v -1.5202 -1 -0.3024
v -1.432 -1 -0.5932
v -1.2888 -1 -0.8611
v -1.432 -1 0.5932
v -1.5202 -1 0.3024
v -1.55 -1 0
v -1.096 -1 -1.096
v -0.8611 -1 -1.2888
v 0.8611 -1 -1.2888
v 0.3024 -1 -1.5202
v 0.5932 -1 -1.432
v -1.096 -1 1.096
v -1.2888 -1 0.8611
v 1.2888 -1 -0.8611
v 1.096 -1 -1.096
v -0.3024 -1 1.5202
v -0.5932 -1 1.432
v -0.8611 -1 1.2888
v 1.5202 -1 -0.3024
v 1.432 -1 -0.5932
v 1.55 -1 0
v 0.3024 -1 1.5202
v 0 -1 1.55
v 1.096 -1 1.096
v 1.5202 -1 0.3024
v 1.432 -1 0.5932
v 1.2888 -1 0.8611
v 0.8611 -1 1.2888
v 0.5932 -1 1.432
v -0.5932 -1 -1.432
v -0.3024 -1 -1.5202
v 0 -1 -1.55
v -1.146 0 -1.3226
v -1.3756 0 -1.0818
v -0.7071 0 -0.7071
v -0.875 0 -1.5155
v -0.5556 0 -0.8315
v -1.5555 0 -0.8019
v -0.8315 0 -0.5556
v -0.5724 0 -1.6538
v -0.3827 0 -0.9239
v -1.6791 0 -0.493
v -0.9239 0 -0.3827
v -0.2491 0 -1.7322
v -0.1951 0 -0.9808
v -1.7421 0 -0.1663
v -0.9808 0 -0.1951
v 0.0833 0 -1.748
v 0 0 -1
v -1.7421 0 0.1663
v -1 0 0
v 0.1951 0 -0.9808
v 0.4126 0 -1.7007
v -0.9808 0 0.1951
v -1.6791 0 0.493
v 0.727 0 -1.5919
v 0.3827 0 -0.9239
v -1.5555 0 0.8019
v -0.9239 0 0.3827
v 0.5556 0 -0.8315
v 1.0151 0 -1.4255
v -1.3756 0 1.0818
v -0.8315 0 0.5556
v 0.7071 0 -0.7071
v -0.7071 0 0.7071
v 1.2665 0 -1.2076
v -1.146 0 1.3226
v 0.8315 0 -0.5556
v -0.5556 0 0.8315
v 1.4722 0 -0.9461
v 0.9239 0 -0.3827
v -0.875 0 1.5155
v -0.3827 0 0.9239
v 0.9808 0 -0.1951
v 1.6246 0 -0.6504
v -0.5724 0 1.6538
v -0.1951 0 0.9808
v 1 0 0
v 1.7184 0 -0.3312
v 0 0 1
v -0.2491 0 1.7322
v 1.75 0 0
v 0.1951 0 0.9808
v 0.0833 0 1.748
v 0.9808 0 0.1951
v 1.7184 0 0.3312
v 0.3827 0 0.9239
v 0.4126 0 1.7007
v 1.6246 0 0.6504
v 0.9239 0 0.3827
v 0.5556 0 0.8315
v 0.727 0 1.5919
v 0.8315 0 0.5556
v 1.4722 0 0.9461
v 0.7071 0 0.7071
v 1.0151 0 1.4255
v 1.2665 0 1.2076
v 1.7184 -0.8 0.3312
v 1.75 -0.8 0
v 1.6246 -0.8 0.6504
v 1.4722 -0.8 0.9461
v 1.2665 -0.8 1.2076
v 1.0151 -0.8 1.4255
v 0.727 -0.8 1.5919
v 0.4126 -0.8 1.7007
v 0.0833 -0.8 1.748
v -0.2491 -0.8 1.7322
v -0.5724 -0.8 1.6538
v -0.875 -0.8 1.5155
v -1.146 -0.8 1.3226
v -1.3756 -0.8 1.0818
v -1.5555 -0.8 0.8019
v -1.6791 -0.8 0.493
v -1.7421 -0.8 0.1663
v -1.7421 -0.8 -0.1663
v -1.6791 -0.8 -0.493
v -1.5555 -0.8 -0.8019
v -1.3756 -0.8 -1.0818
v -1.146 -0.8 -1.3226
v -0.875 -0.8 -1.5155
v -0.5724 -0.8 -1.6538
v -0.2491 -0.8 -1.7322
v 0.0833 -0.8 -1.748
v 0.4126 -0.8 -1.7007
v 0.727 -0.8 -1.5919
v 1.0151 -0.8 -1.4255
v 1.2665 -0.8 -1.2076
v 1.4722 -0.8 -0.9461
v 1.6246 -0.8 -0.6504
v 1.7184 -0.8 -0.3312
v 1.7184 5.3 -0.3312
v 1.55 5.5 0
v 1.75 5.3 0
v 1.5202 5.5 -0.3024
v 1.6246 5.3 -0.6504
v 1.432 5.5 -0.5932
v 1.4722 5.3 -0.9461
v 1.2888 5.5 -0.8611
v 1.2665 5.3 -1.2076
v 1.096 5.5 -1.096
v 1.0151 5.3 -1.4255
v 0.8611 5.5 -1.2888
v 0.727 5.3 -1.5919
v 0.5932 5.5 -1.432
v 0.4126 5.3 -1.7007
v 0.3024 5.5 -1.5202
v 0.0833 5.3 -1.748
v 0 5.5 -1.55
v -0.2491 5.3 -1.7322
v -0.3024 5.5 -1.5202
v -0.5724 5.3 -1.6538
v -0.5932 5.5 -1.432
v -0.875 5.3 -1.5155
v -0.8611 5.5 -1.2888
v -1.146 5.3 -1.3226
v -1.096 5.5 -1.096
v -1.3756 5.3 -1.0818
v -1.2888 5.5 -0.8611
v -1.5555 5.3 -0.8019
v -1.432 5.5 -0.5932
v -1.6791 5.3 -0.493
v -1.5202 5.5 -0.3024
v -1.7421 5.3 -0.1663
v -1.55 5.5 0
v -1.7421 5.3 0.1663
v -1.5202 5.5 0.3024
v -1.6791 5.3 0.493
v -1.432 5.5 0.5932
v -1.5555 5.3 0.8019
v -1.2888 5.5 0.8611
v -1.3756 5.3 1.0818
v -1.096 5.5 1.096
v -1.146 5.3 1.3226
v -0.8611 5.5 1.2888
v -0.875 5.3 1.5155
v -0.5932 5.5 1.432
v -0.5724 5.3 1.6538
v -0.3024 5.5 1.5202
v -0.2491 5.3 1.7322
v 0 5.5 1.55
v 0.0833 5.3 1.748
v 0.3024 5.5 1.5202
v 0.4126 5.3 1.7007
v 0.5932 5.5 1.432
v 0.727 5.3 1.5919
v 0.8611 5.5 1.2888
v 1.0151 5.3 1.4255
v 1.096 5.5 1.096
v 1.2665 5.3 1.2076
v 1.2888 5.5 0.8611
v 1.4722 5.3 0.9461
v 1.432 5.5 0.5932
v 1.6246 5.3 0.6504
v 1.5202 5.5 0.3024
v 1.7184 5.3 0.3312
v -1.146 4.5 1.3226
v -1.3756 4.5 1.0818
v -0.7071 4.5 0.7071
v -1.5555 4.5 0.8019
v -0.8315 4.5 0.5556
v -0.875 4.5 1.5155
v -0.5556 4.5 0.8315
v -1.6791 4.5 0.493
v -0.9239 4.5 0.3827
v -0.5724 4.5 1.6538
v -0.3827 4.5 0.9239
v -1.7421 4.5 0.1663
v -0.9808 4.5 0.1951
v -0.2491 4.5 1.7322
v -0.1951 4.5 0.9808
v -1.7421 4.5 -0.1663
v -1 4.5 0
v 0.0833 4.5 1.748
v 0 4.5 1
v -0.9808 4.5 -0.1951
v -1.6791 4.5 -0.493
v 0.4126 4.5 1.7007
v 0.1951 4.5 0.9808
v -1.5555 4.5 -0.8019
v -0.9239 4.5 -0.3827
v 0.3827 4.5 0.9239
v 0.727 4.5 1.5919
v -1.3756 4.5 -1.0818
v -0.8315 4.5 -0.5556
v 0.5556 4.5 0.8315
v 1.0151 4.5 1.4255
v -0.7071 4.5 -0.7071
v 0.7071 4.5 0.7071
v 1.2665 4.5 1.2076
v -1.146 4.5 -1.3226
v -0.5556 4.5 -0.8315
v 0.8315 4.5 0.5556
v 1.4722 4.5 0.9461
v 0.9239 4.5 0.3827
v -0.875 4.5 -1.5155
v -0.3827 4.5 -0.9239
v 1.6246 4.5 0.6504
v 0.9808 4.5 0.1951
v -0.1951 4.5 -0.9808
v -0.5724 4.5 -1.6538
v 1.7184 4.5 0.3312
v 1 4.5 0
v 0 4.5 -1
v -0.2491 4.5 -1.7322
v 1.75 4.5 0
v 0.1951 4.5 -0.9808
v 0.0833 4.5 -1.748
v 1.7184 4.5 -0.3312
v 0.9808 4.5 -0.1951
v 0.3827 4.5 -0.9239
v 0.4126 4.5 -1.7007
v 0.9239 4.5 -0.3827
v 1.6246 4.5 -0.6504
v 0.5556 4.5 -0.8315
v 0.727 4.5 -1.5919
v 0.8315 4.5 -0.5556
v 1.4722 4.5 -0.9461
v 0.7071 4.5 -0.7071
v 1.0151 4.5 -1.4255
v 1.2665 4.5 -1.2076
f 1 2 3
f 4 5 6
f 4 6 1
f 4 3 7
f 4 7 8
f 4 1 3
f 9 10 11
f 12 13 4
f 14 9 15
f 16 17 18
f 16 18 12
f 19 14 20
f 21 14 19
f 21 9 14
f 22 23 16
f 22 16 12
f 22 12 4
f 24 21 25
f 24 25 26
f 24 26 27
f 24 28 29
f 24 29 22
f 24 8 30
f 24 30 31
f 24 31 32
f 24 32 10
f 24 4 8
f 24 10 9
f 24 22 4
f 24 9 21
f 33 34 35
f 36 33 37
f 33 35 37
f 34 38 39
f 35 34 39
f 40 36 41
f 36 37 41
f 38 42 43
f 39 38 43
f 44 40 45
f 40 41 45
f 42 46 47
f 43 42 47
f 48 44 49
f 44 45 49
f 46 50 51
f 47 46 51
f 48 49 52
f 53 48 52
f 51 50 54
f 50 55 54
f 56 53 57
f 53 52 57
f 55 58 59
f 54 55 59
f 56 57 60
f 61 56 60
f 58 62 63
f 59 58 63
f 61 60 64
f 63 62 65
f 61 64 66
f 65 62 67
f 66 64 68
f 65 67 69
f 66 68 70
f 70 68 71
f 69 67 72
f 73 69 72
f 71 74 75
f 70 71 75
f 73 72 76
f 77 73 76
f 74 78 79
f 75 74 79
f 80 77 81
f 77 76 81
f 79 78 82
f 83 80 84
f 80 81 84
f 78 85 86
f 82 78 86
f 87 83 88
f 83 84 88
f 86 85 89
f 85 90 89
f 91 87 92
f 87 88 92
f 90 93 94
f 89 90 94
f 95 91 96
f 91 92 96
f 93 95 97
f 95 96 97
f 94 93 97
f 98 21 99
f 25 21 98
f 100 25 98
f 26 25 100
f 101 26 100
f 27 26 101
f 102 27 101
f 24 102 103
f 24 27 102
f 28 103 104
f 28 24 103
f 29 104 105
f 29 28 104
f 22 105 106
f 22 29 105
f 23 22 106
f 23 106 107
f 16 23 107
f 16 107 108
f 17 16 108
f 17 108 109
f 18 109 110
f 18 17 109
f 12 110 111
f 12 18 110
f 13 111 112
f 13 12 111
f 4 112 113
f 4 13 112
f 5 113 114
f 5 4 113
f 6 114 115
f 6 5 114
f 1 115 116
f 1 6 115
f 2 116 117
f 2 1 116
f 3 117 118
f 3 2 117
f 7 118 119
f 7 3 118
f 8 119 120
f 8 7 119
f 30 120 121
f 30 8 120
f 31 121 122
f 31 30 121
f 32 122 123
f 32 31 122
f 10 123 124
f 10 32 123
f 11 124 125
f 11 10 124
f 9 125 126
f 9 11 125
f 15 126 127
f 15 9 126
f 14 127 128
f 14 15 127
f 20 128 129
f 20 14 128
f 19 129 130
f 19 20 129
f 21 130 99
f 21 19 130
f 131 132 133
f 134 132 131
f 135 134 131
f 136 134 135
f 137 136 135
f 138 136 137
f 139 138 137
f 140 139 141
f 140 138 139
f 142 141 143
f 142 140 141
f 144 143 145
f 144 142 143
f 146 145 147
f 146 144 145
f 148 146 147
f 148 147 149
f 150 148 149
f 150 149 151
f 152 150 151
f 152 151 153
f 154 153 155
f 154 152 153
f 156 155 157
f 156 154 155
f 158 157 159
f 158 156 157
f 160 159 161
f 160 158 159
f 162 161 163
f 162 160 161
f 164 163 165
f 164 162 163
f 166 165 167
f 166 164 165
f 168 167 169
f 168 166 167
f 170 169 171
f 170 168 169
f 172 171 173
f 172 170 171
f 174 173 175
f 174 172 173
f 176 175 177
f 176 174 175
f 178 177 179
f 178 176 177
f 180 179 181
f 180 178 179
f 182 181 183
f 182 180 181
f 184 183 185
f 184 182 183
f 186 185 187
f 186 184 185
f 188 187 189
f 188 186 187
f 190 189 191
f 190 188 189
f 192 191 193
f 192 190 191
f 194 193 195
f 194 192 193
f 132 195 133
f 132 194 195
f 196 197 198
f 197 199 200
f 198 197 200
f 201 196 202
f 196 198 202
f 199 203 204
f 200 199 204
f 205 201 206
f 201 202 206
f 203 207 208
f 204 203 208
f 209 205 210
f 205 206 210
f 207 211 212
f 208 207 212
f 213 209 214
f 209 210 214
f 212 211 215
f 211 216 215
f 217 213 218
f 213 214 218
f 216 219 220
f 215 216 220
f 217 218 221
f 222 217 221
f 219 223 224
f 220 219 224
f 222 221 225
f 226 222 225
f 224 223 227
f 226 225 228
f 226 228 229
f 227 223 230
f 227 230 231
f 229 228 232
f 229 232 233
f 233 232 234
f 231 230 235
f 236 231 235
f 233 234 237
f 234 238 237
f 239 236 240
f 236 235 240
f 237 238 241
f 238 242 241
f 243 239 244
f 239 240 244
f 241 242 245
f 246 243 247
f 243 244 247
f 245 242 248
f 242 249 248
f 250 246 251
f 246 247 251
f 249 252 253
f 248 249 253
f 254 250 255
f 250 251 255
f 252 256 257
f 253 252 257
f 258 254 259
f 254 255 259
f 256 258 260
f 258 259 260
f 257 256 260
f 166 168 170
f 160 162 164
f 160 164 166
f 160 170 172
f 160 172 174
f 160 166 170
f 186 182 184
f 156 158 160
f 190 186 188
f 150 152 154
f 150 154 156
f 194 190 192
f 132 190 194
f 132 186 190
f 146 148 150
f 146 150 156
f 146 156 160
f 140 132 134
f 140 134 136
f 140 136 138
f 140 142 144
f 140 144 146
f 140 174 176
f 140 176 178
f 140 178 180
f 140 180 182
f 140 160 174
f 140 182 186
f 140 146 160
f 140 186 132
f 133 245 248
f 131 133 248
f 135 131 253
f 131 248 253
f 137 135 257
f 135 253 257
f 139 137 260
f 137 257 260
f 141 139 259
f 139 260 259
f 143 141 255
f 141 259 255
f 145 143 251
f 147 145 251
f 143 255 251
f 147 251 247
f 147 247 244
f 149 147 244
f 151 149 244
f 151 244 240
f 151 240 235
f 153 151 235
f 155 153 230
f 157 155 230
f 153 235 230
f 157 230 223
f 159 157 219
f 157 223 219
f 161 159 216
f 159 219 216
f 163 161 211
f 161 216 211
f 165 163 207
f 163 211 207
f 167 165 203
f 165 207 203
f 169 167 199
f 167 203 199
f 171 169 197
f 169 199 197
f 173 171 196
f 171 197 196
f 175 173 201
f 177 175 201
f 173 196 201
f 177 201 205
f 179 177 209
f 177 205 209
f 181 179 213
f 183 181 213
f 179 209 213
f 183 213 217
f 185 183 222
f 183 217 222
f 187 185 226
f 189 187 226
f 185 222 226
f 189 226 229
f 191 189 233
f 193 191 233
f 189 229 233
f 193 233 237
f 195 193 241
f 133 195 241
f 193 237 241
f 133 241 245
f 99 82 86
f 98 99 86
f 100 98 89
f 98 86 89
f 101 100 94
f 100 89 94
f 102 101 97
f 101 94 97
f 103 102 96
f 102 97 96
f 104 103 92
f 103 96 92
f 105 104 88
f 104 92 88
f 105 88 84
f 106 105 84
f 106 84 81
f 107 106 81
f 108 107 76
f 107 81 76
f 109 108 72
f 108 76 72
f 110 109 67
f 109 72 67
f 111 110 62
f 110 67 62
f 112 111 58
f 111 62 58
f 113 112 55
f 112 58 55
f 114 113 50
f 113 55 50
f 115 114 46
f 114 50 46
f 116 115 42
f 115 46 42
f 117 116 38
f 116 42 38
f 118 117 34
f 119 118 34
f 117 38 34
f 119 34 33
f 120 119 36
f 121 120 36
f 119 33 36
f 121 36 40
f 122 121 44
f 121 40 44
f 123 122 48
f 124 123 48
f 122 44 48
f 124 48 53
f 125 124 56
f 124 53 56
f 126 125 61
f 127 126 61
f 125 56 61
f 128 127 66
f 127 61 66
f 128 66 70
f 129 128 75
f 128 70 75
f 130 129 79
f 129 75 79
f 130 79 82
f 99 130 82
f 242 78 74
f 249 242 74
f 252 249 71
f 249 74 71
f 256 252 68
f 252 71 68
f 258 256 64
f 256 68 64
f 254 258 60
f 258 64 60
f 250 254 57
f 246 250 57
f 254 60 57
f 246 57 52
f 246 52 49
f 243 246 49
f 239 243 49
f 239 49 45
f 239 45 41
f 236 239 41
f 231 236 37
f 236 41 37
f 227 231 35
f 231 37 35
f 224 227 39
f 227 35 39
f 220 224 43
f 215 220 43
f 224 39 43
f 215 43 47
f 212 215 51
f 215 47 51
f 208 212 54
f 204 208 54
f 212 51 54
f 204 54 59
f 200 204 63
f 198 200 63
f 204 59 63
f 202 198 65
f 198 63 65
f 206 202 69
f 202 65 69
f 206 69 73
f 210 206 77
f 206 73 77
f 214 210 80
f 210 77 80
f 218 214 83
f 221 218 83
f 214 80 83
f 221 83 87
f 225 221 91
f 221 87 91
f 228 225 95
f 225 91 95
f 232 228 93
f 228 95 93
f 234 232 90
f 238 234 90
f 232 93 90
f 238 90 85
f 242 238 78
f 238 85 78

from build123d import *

# Parameters (mm, degrees)
SKETCH1_R           = 1
BOSS_EXTRUDE1_DEPTH = 4.5
SKETCH2_R           = 1.75
BOSS_EXTRUDE2_DEPTH = 1
CHAMFER1_SIZE       = 0.2
SKETCH3_R           = 1.75
BOSS_EXTRUDE3_DEPTH = 1
CHAMFER2_SIZE       = 0.2


with BuildPart() as part:
    # Sketch1 → Boss-Extrude1 (new body)
    with BuildSketch(Plane(origin=(0, 0, 0), x_dir=(1, 0, 0), z_dir=(0, 1, 0))):
        Circle(SKETCH1_R)
    extrude(amount=BOSS_EXTRUDE1_DEPTH)

    # Sketch2 → Boss-Extrude2 (add)
    with BuildSketch(Plane(origin=(0, 4.5, 0), x_dir=(1, 0, 0), z_dir=(0, 1, 0))):
        Circle(SKETCH2_R)
    extrude(amount=BOSS_EXTRUDE2_DEPTH)

    # Chamfer1
    chamfer1_edges = [part.edges().sort_by_distance(p)[0] for p in [
        (-1.75, 5.5, 0),
    ]]
    chamfer(chamfer1_edges, length=CHAMFER1_SIZE)

    # Sketch3 → Boss-Extrude3 (add)
    with BuildSketch(Plane.XZ):
        Circle(SKETCH3_R)
    extrude(amount=BOSS_EXTRUDE3_DEPTH)

    # Chamfer2
    chamfer2_edges = [part.edges().sort_by_distance(p)[0] for p in [
        (-1.75, -1, 0),
    ]]
    chamfer(chamfer2_edges, length=CHAMFER2_SIZE)


solid = part.part
